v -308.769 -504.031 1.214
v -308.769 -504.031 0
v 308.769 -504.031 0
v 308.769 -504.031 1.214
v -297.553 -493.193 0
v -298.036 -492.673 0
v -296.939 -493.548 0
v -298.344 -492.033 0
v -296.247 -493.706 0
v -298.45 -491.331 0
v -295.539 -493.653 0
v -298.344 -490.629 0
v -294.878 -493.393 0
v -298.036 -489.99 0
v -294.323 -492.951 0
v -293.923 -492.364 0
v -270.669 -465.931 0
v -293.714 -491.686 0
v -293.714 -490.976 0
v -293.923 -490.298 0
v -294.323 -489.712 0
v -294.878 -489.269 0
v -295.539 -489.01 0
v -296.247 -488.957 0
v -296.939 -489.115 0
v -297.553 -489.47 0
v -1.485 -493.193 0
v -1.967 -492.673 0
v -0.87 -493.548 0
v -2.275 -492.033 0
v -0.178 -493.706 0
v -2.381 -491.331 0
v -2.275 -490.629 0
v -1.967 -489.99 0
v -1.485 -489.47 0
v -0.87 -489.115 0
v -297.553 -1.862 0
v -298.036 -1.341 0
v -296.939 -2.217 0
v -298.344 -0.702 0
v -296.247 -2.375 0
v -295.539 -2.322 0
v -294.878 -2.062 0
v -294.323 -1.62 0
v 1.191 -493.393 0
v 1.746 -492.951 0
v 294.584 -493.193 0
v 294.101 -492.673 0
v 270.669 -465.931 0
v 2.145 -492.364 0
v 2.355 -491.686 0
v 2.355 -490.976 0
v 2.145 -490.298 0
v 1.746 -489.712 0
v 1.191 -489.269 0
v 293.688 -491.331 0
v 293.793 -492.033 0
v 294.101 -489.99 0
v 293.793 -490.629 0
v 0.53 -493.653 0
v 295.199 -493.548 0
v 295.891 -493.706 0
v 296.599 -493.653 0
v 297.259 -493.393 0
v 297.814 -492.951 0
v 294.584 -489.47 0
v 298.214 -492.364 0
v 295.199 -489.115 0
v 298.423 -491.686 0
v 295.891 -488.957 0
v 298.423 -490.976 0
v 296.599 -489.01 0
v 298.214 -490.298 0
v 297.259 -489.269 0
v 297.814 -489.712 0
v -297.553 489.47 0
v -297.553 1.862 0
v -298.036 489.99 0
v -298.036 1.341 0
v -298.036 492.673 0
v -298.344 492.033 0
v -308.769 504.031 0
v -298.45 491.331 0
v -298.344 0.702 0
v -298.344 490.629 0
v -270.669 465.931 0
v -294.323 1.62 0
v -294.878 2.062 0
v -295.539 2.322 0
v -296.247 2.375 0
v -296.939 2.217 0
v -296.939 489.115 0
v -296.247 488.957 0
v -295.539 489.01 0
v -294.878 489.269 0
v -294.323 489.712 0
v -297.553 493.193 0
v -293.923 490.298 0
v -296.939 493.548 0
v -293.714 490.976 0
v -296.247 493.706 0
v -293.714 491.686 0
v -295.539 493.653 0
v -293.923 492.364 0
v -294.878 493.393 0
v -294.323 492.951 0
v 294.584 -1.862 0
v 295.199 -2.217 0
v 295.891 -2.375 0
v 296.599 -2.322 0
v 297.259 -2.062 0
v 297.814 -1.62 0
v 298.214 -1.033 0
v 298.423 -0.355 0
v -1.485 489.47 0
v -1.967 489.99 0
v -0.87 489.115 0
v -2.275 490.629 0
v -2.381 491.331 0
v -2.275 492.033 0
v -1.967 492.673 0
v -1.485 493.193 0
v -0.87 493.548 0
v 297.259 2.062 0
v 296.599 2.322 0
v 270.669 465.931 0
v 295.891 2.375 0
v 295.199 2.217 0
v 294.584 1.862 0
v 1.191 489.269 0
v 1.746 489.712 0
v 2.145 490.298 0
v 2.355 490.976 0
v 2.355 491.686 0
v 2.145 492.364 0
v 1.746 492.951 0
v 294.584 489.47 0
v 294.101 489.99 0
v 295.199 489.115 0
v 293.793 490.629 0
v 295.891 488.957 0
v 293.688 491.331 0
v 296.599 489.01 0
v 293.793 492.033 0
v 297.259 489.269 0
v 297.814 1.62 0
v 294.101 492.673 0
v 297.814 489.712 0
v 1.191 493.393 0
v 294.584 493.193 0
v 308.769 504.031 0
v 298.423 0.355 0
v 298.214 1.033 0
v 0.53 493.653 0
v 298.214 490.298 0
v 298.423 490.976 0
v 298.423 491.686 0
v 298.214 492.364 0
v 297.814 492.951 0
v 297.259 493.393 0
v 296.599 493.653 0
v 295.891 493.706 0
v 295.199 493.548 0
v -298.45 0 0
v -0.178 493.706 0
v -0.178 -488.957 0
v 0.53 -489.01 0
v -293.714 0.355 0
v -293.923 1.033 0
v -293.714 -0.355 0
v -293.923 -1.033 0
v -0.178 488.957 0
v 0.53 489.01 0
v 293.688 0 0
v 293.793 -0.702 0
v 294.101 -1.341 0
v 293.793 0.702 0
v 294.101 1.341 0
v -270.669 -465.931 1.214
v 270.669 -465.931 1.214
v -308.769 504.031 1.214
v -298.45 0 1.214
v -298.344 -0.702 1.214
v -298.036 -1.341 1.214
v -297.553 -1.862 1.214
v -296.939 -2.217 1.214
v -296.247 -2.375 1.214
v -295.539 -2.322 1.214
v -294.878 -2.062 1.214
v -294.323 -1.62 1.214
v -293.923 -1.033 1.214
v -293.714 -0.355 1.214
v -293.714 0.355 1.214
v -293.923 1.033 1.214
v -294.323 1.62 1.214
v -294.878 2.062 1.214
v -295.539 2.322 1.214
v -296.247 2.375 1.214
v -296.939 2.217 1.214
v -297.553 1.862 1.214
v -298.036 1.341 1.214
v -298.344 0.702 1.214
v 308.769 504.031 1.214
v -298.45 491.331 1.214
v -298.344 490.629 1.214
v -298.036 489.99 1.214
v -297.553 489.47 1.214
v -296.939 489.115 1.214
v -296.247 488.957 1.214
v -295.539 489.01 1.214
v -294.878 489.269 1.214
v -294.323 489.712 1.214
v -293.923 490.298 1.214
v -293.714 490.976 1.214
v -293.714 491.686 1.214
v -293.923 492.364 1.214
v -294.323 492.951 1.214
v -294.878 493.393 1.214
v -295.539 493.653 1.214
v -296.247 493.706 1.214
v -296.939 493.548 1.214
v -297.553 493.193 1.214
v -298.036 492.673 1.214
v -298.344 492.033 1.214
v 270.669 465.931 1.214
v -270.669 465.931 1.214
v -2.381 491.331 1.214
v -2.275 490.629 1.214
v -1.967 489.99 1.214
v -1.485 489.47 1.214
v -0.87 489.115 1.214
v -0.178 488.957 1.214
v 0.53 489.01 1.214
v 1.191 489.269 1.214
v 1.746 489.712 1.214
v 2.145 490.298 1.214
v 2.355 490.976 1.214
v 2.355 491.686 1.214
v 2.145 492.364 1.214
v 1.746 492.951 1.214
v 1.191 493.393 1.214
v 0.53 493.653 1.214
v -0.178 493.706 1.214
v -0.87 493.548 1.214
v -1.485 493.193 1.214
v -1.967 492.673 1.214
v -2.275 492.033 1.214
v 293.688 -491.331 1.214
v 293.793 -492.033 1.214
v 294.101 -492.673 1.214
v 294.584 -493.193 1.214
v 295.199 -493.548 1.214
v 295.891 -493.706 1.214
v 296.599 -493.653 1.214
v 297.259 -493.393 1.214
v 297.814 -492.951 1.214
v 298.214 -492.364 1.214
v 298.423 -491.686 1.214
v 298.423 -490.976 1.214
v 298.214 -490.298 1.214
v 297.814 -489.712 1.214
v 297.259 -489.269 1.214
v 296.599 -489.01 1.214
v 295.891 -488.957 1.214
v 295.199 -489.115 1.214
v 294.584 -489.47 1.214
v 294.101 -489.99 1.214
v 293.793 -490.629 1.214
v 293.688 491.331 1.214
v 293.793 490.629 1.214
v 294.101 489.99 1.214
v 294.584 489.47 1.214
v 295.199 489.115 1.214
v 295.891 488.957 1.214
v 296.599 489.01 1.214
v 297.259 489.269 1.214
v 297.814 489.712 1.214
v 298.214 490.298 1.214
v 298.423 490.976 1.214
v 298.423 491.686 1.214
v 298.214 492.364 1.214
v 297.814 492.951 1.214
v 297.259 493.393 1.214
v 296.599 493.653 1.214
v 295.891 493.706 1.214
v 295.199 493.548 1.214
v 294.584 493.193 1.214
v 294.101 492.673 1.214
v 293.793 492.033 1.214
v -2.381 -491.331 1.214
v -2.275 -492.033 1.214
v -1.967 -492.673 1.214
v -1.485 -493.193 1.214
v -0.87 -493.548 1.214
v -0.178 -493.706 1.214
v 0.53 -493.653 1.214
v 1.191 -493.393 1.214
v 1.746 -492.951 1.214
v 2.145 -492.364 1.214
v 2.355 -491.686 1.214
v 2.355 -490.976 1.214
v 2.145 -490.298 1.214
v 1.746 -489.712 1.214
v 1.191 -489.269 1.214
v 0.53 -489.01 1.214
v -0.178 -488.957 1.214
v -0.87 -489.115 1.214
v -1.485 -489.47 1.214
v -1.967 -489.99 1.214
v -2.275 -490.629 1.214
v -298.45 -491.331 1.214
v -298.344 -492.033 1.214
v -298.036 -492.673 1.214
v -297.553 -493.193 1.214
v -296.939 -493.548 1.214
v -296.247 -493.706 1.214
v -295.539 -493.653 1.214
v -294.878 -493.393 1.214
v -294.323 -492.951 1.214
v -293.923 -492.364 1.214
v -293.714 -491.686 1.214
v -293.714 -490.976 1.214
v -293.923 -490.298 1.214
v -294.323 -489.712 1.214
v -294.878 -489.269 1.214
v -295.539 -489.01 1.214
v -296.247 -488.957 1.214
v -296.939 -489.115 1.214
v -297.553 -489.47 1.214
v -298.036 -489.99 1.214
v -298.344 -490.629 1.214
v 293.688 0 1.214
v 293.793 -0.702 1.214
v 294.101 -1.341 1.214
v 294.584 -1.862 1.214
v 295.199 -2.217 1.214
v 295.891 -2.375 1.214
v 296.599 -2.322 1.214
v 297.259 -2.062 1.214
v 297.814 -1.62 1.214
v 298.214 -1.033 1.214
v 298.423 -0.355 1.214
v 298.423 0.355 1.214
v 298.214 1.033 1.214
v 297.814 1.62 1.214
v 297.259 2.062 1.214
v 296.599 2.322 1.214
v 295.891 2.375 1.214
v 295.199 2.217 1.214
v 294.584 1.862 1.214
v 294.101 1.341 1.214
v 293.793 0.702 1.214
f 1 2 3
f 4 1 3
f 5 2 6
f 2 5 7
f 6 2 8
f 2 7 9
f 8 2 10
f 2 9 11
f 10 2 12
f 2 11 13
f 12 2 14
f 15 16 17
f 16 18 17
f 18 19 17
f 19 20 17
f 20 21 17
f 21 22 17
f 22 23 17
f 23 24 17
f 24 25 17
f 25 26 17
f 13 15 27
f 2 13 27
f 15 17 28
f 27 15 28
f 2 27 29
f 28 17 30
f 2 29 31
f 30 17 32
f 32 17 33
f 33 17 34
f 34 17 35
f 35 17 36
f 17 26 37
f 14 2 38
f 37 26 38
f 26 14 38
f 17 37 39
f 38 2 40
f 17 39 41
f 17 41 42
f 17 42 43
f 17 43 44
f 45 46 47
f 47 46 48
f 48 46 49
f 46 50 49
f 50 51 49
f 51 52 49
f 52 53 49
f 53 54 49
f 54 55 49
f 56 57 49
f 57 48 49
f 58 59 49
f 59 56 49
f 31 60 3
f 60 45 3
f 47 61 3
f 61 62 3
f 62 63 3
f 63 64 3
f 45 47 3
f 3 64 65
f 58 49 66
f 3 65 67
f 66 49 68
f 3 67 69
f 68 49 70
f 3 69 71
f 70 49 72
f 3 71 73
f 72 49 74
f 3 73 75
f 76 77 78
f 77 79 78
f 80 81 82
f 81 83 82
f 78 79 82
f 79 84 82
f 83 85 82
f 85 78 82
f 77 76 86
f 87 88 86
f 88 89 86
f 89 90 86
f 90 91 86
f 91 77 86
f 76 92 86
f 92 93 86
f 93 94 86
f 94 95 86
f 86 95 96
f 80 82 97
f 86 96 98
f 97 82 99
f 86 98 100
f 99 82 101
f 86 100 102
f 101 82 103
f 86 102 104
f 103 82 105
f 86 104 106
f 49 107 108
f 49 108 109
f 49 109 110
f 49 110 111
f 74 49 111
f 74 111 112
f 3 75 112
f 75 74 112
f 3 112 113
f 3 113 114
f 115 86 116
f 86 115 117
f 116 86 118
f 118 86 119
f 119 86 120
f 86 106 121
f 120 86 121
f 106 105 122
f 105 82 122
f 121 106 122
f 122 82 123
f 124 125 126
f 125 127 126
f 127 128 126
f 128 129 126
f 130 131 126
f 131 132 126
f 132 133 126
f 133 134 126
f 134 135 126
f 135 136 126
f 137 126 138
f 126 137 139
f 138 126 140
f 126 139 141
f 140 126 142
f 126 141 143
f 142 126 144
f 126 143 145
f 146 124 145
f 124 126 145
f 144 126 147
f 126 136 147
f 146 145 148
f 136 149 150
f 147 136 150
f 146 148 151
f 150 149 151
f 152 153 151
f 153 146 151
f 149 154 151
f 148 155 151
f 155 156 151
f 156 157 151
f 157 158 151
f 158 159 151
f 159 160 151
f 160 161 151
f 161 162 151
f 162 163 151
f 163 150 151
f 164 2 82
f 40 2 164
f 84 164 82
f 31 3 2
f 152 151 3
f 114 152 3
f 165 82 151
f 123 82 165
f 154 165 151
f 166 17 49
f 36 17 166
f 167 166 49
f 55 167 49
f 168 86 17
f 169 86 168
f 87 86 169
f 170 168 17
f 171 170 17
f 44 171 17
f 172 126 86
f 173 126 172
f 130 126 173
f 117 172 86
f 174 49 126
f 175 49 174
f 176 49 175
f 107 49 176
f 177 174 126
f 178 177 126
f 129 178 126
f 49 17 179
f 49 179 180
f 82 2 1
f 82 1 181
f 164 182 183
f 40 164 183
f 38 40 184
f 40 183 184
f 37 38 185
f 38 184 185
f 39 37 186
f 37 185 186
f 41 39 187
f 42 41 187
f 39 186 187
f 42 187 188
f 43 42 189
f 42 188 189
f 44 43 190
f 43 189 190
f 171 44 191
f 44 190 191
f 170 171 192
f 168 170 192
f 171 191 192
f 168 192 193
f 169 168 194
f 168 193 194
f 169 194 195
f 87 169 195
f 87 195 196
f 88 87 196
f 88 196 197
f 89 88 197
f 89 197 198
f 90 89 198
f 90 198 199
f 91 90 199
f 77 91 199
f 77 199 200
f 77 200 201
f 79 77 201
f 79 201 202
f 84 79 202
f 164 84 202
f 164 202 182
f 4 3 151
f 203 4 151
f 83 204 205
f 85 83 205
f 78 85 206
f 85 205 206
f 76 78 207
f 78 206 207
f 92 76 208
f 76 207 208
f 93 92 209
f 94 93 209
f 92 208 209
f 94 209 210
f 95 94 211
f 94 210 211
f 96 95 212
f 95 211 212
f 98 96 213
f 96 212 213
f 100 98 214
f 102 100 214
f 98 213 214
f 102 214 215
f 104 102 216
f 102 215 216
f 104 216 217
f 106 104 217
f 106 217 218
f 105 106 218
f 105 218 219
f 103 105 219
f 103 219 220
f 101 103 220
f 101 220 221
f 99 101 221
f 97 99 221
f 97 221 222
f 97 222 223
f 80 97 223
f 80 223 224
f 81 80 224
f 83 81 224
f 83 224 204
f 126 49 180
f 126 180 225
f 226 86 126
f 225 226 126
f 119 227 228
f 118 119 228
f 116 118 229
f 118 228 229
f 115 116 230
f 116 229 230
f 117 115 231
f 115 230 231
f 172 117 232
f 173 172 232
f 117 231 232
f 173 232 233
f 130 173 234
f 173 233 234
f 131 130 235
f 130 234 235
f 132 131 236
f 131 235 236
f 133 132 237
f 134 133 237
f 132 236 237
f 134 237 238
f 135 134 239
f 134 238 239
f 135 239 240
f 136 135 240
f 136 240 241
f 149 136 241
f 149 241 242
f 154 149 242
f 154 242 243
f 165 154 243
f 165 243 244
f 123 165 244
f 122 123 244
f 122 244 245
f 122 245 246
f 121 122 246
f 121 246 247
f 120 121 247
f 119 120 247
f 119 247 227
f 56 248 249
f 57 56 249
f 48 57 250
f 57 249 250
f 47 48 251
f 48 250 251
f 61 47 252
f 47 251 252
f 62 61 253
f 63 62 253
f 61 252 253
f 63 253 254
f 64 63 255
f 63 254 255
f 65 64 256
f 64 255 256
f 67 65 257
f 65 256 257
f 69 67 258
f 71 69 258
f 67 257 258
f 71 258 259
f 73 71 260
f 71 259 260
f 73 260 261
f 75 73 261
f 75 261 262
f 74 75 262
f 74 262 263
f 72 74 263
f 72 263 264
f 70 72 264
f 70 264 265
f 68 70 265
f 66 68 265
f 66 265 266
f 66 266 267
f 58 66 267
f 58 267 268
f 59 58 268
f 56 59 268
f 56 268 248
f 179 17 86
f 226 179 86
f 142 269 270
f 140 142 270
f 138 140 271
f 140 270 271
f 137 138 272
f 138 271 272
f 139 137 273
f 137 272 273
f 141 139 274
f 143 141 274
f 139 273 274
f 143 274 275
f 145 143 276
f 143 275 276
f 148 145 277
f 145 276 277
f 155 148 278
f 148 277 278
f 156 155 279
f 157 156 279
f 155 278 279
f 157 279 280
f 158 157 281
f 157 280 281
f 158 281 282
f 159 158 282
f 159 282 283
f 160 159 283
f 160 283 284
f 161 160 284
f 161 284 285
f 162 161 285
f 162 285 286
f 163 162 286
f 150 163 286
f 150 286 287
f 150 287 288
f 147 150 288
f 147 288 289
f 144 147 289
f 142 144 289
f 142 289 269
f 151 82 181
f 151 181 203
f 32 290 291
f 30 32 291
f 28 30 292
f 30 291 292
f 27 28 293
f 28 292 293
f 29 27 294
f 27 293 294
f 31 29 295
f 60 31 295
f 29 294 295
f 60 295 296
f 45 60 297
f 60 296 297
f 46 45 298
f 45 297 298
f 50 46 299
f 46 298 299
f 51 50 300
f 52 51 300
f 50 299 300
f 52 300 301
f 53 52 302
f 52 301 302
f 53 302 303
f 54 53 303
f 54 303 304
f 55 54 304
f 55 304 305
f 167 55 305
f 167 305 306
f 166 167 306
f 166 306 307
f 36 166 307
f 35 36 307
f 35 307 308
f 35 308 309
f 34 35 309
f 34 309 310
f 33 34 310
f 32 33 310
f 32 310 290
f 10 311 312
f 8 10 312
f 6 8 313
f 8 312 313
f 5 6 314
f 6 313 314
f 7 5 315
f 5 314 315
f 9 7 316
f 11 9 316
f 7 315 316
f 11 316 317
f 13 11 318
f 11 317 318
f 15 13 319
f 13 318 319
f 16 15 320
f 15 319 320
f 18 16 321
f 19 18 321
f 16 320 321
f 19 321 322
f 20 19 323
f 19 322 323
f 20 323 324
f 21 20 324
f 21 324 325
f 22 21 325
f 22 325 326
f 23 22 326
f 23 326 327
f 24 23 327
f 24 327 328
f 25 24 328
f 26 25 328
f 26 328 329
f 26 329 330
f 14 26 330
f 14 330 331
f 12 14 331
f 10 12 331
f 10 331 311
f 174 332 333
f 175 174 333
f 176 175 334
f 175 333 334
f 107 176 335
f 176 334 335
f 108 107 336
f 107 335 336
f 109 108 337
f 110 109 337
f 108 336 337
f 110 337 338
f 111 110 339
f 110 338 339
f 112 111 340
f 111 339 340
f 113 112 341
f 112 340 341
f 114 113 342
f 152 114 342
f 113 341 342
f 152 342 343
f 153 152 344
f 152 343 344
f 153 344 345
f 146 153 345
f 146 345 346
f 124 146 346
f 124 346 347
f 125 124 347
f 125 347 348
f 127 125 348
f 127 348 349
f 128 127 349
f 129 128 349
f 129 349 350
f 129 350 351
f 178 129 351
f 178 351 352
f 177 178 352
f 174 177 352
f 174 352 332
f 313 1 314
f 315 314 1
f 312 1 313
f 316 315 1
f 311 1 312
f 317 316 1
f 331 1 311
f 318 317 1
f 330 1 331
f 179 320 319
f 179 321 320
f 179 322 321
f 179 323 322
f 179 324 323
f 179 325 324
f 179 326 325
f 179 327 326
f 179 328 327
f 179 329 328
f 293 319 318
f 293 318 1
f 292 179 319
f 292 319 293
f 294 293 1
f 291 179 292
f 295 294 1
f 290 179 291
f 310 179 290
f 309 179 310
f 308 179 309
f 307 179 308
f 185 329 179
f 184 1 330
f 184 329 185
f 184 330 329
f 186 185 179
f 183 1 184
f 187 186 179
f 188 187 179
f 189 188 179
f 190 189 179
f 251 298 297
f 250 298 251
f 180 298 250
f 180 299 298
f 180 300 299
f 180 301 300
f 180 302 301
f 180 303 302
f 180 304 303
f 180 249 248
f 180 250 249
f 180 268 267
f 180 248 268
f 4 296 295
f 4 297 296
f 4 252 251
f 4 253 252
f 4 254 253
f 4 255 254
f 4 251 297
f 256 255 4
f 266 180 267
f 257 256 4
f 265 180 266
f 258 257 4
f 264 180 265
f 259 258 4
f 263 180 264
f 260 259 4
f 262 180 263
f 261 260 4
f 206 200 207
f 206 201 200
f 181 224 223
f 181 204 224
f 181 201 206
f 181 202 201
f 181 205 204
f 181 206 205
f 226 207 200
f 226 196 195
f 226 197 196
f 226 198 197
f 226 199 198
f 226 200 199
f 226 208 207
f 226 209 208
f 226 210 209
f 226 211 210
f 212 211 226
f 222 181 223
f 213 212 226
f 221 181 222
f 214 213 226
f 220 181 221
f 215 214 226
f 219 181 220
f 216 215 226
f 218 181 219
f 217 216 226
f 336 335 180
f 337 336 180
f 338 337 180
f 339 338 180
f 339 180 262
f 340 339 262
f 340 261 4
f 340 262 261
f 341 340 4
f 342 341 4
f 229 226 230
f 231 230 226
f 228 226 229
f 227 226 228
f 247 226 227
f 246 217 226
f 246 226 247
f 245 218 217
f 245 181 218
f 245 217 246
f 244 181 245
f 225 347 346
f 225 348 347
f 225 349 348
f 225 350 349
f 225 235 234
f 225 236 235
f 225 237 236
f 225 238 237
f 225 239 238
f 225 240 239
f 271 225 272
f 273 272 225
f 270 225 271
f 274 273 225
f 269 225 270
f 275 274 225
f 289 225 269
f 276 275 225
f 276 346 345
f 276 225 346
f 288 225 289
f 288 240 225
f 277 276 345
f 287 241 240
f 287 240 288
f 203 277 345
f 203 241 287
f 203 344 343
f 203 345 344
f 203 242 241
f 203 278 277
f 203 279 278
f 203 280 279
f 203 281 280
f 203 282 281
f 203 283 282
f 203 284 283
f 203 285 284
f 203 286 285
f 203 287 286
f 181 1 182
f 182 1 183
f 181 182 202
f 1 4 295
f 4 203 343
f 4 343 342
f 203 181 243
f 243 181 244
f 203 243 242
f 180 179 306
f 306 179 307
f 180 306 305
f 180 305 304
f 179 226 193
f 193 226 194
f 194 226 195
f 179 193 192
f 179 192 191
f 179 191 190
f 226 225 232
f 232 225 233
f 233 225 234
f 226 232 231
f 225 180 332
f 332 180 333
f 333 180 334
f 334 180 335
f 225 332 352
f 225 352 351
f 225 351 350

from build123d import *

# Parameters (mm, degrees)
F0_W     = 617.5375
F0_H     = 1008.0625
F0_W_2   = 541.3375
F0_H_2   = 931.8625
F1_DEPTH = 1.21412
F3_D     = 4.7625


with BuildPart() as f1:
    # F0 (on Top) → F1 (new body)
    with BuildSketch(Plane.XY):
        Rectangle(F0_W, F0_H)
        Rectangle(F0_W_2, F0_H_2, mode=Mode.SUBTRACT)
    extrude(amount=F1_DEPTH)

    # F3 (through all)
    with Locations(Plane(origin=(0, 0, 0), x_dir=(1, 0, 0), z_dir=(0, 0, -1))):
        with Locations((-296.06875, 491.33125), (0, 491.33125), (296.06875, 491.33125), (296.06875, 0), (296.06875, -491.33125), (0, -491.33125), (-296.06875, -491.33125), (-296.06875, 0)):
            Hole(F3_D / 2)


solid = f1.part
